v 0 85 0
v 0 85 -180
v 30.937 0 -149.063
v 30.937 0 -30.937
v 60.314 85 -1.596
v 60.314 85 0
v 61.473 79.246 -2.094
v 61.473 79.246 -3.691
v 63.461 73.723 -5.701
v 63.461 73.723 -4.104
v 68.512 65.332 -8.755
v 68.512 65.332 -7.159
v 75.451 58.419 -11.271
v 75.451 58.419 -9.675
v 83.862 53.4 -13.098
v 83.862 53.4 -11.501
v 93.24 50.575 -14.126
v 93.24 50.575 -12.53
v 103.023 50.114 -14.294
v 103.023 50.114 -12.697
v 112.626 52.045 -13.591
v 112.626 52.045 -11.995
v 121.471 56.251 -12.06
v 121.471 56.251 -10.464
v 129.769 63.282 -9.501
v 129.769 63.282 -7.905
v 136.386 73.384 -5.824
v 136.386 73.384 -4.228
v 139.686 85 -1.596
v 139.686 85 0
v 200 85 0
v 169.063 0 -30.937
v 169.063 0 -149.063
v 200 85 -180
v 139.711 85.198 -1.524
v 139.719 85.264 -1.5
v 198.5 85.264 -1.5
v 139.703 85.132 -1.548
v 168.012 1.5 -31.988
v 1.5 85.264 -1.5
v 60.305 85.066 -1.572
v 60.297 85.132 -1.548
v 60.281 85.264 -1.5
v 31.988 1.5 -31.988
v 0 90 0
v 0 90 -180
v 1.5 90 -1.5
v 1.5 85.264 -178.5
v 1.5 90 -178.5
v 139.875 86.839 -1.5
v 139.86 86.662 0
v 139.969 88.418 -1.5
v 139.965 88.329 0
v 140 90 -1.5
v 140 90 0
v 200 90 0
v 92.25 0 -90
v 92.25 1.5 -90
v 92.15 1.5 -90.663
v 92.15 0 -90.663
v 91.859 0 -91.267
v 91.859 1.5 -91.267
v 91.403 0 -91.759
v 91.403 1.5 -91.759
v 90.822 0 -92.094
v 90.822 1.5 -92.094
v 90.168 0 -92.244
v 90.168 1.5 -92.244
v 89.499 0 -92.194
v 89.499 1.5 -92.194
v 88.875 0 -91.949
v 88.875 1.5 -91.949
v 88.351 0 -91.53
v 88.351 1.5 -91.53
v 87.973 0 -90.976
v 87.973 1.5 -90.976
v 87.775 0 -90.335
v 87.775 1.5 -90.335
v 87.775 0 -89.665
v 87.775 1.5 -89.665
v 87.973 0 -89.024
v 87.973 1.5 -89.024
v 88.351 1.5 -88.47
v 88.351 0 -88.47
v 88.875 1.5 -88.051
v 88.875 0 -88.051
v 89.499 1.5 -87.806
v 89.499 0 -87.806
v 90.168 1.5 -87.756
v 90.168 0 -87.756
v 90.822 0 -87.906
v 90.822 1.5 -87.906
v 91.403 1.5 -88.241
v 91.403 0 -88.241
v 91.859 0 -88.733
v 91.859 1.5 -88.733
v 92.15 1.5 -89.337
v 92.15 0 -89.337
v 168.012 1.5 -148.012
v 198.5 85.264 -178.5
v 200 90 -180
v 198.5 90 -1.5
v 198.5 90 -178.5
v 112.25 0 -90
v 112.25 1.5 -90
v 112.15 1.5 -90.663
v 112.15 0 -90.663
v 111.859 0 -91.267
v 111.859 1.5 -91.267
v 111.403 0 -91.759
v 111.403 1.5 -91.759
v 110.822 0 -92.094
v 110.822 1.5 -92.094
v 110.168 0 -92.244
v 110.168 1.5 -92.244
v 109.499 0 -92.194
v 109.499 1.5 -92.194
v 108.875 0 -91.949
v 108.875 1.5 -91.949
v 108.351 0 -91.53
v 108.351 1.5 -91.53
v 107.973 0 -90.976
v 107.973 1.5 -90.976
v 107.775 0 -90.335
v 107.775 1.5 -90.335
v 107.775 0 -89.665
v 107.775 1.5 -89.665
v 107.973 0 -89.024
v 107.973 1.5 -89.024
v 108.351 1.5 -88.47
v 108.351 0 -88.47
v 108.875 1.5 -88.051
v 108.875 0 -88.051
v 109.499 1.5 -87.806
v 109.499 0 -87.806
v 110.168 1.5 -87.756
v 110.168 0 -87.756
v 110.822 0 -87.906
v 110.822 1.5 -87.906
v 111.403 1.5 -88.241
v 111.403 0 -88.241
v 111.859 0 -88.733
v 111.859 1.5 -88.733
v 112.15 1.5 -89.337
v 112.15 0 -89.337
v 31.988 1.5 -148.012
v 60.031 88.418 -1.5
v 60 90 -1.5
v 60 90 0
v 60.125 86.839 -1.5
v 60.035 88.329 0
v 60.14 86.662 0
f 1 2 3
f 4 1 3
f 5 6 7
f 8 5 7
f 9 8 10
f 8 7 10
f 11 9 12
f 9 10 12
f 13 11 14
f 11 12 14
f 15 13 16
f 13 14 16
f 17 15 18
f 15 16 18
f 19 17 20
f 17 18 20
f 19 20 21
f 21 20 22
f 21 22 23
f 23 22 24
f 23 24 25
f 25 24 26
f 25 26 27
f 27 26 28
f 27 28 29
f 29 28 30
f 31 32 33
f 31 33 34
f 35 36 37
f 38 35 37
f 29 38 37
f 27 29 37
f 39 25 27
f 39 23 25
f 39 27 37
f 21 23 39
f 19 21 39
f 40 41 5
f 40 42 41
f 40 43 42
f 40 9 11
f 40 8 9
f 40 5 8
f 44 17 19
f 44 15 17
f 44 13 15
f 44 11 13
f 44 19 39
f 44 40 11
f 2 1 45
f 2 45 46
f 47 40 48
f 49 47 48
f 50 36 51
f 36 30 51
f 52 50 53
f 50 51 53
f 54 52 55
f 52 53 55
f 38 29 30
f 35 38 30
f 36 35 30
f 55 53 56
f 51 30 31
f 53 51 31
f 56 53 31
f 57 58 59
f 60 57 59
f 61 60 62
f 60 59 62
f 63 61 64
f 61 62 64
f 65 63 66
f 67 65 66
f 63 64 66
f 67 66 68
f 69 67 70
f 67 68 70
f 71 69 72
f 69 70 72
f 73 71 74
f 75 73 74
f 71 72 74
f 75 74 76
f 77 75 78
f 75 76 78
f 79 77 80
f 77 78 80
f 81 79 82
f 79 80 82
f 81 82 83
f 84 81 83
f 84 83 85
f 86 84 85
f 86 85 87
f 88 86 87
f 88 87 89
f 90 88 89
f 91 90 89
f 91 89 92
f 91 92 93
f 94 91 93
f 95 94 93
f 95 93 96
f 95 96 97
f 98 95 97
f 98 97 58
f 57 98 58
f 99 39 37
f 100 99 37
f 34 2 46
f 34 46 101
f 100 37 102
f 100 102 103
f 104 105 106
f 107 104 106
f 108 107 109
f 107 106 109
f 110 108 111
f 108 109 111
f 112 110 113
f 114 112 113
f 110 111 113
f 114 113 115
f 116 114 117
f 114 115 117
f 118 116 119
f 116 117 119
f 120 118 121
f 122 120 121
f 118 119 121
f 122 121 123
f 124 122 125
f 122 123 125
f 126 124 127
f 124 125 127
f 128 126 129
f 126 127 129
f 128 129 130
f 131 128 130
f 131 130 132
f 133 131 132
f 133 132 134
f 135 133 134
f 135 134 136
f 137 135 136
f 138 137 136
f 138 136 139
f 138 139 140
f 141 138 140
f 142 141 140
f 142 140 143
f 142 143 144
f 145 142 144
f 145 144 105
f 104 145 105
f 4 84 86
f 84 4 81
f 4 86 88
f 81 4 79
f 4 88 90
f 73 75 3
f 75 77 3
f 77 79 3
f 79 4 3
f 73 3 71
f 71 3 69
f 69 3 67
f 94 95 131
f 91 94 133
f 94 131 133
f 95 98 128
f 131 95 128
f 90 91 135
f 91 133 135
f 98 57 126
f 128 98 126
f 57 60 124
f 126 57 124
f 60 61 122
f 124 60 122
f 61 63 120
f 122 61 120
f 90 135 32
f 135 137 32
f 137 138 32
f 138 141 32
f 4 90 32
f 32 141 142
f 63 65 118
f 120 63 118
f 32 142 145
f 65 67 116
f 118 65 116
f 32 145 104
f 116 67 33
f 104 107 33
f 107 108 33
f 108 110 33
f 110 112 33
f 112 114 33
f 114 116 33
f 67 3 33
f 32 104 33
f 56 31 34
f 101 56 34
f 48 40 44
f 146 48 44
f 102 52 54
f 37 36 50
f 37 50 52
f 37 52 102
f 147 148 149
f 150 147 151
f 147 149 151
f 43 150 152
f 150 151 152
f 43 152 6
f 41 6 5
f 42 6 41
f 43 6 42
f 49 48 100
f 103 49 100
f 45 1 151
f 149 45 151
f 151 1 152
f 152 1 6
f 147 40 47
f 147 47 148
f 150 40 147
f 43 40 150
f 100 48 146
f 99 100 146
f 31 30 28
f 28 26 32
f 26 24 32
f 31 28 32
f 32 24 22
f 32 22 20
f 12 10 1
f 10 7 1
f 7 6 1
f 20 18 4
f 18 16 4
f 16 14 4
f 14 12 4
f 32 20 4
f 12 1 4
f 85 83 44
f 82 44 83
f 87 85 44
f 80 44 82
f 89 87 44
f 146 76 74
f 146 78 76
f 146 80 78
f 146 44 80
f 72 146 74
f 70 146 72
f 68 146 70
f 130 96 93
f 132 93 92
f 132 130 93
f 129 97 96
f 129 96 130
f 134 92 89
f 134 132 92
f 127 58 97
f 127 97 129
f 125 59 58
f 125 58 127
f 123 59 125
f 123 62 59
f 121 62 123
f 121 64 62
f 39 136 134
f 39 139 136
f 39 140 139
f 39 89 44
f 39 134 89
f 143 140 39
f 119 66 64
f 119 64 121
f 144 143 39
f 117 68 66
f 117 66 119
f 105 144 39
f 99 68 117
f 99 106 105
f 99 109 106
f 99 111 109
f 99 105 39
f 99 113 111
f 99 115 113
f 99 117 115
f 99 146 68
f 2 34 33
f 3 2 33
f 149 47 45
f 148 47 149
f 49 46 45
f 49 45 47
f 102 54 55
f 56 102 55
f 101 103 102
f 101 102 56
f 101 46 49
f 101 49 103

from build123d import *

# Parameters (mm, degrees)
SKETCH1_W               = 200
SKETCH1_H               = 180
BOSS_EXTRUDE1_DEPTH     = 90
CUT_EXTRUDE1_DEPTH      = 1
CUT_EXTRUDE1_DEPTH_BACK = 181
CUT_EXTRUDE2_DEPTH      = 201
SHELL1_T                = -1.5
SKETCH6_R               = 2.25
HINGE_HOLES_DEPTH       = 2.5
CUT_EXTRUDE4_DEPTH      = 50


with BuildPart() as part:
    # Sketch1 → Boss-Extrude1 (new body)
    with BuildSketch(Plane(origin=(0, 0, 0), x_dir=(1, 0, 0), z_dir=(0, 1, 0))):
        with Locations((100, 90)):
            Rectangle(SKETCH1_W, SKETCH1_H)
    extrude(amount=BOSS_EXTRUDE1_DEPTH)

    # Sketch4 → Cut-Extrude1 (cut, two sides)
    with BuildSketch(Plane.XY) as cut_extrude1_sk:
        Polygon((0, 85), (30.937469913, 0), (0, 0), align=None)
        Polygon((200, 85), (200, 0), (169.062530087, 0), align=None)
    extrude(amount=CUT_EXTRUDE1_DEPTH, mode=Mode.SUBTRACT)
    extrude(cut_extrude1_sk.sketch, amount=-CUT_EXTRUDE1_DEPTH_BACK, mode=Mode.SUBTRACT)

    # Sketch5 → Cut-Extrude2 (cut, through all)
    with BuildSketch(Plane.ZY):
        Polygon((-180, 85), (-149.062530087, 0), (-180, 0), align=None)
        Polygon((0, 85), (-30.937469913, 0), (0, 0), align=None)
    extrude(amount=-CUT_EXTRUDE2_DEPTH, mode=Mode.SUBTRACT)

    # Shell1
    shell1_openings = [part.faces().sort_by_distance(p)[0] for p in [
        (100, 90, -90),
    ]]
    offset(amount=SHELL1_T, openings=shell1_openings, kind=Kind.INTERSECTION)

    # Sketch6 → Hinge-Holes (cut, through all)
    with BuildSketch(Plane(origin=(0, 1.5, 0), x_dir=(1, 0, 0), z_dir=(0, 1, 0))):
        with Locations((90, 90)):
            Circle(SKETCH6_R)
        with Locations((110, 90)):
            Circle(SKETCH6_R)
    extrude(amount=-HINGE_HOLES_DEPTH, mode=Mode.SUBTRACT)

    # Sketch7 → Cut-Extrude4 (cut)
    with BuildSketch(Plane.XY):
        with BuildLine():
            Line((139.686269666, 85), (60.313730334, 85))
            ThreePointArc((60.313730334, 85), (100, 50), (139.686269666, 85))
        make_face()
        with BuildLine():
            Line((140, 90), (60, 90))
            ThreePointArc((60, 90), (60.078509631, 87.495083498), (60.313730334, 85))
            Line((60.313730334, 85), (139.686269666, 85))
            ThreePointArc((139.686269666, 85), (139.921490369, 87.495083498), (140, 90))
        make_face()
    extrude(amount=-CUT_EXTRUDE4_DEPTH, mode=Mode.SUBTRACT)


solid = part.part
